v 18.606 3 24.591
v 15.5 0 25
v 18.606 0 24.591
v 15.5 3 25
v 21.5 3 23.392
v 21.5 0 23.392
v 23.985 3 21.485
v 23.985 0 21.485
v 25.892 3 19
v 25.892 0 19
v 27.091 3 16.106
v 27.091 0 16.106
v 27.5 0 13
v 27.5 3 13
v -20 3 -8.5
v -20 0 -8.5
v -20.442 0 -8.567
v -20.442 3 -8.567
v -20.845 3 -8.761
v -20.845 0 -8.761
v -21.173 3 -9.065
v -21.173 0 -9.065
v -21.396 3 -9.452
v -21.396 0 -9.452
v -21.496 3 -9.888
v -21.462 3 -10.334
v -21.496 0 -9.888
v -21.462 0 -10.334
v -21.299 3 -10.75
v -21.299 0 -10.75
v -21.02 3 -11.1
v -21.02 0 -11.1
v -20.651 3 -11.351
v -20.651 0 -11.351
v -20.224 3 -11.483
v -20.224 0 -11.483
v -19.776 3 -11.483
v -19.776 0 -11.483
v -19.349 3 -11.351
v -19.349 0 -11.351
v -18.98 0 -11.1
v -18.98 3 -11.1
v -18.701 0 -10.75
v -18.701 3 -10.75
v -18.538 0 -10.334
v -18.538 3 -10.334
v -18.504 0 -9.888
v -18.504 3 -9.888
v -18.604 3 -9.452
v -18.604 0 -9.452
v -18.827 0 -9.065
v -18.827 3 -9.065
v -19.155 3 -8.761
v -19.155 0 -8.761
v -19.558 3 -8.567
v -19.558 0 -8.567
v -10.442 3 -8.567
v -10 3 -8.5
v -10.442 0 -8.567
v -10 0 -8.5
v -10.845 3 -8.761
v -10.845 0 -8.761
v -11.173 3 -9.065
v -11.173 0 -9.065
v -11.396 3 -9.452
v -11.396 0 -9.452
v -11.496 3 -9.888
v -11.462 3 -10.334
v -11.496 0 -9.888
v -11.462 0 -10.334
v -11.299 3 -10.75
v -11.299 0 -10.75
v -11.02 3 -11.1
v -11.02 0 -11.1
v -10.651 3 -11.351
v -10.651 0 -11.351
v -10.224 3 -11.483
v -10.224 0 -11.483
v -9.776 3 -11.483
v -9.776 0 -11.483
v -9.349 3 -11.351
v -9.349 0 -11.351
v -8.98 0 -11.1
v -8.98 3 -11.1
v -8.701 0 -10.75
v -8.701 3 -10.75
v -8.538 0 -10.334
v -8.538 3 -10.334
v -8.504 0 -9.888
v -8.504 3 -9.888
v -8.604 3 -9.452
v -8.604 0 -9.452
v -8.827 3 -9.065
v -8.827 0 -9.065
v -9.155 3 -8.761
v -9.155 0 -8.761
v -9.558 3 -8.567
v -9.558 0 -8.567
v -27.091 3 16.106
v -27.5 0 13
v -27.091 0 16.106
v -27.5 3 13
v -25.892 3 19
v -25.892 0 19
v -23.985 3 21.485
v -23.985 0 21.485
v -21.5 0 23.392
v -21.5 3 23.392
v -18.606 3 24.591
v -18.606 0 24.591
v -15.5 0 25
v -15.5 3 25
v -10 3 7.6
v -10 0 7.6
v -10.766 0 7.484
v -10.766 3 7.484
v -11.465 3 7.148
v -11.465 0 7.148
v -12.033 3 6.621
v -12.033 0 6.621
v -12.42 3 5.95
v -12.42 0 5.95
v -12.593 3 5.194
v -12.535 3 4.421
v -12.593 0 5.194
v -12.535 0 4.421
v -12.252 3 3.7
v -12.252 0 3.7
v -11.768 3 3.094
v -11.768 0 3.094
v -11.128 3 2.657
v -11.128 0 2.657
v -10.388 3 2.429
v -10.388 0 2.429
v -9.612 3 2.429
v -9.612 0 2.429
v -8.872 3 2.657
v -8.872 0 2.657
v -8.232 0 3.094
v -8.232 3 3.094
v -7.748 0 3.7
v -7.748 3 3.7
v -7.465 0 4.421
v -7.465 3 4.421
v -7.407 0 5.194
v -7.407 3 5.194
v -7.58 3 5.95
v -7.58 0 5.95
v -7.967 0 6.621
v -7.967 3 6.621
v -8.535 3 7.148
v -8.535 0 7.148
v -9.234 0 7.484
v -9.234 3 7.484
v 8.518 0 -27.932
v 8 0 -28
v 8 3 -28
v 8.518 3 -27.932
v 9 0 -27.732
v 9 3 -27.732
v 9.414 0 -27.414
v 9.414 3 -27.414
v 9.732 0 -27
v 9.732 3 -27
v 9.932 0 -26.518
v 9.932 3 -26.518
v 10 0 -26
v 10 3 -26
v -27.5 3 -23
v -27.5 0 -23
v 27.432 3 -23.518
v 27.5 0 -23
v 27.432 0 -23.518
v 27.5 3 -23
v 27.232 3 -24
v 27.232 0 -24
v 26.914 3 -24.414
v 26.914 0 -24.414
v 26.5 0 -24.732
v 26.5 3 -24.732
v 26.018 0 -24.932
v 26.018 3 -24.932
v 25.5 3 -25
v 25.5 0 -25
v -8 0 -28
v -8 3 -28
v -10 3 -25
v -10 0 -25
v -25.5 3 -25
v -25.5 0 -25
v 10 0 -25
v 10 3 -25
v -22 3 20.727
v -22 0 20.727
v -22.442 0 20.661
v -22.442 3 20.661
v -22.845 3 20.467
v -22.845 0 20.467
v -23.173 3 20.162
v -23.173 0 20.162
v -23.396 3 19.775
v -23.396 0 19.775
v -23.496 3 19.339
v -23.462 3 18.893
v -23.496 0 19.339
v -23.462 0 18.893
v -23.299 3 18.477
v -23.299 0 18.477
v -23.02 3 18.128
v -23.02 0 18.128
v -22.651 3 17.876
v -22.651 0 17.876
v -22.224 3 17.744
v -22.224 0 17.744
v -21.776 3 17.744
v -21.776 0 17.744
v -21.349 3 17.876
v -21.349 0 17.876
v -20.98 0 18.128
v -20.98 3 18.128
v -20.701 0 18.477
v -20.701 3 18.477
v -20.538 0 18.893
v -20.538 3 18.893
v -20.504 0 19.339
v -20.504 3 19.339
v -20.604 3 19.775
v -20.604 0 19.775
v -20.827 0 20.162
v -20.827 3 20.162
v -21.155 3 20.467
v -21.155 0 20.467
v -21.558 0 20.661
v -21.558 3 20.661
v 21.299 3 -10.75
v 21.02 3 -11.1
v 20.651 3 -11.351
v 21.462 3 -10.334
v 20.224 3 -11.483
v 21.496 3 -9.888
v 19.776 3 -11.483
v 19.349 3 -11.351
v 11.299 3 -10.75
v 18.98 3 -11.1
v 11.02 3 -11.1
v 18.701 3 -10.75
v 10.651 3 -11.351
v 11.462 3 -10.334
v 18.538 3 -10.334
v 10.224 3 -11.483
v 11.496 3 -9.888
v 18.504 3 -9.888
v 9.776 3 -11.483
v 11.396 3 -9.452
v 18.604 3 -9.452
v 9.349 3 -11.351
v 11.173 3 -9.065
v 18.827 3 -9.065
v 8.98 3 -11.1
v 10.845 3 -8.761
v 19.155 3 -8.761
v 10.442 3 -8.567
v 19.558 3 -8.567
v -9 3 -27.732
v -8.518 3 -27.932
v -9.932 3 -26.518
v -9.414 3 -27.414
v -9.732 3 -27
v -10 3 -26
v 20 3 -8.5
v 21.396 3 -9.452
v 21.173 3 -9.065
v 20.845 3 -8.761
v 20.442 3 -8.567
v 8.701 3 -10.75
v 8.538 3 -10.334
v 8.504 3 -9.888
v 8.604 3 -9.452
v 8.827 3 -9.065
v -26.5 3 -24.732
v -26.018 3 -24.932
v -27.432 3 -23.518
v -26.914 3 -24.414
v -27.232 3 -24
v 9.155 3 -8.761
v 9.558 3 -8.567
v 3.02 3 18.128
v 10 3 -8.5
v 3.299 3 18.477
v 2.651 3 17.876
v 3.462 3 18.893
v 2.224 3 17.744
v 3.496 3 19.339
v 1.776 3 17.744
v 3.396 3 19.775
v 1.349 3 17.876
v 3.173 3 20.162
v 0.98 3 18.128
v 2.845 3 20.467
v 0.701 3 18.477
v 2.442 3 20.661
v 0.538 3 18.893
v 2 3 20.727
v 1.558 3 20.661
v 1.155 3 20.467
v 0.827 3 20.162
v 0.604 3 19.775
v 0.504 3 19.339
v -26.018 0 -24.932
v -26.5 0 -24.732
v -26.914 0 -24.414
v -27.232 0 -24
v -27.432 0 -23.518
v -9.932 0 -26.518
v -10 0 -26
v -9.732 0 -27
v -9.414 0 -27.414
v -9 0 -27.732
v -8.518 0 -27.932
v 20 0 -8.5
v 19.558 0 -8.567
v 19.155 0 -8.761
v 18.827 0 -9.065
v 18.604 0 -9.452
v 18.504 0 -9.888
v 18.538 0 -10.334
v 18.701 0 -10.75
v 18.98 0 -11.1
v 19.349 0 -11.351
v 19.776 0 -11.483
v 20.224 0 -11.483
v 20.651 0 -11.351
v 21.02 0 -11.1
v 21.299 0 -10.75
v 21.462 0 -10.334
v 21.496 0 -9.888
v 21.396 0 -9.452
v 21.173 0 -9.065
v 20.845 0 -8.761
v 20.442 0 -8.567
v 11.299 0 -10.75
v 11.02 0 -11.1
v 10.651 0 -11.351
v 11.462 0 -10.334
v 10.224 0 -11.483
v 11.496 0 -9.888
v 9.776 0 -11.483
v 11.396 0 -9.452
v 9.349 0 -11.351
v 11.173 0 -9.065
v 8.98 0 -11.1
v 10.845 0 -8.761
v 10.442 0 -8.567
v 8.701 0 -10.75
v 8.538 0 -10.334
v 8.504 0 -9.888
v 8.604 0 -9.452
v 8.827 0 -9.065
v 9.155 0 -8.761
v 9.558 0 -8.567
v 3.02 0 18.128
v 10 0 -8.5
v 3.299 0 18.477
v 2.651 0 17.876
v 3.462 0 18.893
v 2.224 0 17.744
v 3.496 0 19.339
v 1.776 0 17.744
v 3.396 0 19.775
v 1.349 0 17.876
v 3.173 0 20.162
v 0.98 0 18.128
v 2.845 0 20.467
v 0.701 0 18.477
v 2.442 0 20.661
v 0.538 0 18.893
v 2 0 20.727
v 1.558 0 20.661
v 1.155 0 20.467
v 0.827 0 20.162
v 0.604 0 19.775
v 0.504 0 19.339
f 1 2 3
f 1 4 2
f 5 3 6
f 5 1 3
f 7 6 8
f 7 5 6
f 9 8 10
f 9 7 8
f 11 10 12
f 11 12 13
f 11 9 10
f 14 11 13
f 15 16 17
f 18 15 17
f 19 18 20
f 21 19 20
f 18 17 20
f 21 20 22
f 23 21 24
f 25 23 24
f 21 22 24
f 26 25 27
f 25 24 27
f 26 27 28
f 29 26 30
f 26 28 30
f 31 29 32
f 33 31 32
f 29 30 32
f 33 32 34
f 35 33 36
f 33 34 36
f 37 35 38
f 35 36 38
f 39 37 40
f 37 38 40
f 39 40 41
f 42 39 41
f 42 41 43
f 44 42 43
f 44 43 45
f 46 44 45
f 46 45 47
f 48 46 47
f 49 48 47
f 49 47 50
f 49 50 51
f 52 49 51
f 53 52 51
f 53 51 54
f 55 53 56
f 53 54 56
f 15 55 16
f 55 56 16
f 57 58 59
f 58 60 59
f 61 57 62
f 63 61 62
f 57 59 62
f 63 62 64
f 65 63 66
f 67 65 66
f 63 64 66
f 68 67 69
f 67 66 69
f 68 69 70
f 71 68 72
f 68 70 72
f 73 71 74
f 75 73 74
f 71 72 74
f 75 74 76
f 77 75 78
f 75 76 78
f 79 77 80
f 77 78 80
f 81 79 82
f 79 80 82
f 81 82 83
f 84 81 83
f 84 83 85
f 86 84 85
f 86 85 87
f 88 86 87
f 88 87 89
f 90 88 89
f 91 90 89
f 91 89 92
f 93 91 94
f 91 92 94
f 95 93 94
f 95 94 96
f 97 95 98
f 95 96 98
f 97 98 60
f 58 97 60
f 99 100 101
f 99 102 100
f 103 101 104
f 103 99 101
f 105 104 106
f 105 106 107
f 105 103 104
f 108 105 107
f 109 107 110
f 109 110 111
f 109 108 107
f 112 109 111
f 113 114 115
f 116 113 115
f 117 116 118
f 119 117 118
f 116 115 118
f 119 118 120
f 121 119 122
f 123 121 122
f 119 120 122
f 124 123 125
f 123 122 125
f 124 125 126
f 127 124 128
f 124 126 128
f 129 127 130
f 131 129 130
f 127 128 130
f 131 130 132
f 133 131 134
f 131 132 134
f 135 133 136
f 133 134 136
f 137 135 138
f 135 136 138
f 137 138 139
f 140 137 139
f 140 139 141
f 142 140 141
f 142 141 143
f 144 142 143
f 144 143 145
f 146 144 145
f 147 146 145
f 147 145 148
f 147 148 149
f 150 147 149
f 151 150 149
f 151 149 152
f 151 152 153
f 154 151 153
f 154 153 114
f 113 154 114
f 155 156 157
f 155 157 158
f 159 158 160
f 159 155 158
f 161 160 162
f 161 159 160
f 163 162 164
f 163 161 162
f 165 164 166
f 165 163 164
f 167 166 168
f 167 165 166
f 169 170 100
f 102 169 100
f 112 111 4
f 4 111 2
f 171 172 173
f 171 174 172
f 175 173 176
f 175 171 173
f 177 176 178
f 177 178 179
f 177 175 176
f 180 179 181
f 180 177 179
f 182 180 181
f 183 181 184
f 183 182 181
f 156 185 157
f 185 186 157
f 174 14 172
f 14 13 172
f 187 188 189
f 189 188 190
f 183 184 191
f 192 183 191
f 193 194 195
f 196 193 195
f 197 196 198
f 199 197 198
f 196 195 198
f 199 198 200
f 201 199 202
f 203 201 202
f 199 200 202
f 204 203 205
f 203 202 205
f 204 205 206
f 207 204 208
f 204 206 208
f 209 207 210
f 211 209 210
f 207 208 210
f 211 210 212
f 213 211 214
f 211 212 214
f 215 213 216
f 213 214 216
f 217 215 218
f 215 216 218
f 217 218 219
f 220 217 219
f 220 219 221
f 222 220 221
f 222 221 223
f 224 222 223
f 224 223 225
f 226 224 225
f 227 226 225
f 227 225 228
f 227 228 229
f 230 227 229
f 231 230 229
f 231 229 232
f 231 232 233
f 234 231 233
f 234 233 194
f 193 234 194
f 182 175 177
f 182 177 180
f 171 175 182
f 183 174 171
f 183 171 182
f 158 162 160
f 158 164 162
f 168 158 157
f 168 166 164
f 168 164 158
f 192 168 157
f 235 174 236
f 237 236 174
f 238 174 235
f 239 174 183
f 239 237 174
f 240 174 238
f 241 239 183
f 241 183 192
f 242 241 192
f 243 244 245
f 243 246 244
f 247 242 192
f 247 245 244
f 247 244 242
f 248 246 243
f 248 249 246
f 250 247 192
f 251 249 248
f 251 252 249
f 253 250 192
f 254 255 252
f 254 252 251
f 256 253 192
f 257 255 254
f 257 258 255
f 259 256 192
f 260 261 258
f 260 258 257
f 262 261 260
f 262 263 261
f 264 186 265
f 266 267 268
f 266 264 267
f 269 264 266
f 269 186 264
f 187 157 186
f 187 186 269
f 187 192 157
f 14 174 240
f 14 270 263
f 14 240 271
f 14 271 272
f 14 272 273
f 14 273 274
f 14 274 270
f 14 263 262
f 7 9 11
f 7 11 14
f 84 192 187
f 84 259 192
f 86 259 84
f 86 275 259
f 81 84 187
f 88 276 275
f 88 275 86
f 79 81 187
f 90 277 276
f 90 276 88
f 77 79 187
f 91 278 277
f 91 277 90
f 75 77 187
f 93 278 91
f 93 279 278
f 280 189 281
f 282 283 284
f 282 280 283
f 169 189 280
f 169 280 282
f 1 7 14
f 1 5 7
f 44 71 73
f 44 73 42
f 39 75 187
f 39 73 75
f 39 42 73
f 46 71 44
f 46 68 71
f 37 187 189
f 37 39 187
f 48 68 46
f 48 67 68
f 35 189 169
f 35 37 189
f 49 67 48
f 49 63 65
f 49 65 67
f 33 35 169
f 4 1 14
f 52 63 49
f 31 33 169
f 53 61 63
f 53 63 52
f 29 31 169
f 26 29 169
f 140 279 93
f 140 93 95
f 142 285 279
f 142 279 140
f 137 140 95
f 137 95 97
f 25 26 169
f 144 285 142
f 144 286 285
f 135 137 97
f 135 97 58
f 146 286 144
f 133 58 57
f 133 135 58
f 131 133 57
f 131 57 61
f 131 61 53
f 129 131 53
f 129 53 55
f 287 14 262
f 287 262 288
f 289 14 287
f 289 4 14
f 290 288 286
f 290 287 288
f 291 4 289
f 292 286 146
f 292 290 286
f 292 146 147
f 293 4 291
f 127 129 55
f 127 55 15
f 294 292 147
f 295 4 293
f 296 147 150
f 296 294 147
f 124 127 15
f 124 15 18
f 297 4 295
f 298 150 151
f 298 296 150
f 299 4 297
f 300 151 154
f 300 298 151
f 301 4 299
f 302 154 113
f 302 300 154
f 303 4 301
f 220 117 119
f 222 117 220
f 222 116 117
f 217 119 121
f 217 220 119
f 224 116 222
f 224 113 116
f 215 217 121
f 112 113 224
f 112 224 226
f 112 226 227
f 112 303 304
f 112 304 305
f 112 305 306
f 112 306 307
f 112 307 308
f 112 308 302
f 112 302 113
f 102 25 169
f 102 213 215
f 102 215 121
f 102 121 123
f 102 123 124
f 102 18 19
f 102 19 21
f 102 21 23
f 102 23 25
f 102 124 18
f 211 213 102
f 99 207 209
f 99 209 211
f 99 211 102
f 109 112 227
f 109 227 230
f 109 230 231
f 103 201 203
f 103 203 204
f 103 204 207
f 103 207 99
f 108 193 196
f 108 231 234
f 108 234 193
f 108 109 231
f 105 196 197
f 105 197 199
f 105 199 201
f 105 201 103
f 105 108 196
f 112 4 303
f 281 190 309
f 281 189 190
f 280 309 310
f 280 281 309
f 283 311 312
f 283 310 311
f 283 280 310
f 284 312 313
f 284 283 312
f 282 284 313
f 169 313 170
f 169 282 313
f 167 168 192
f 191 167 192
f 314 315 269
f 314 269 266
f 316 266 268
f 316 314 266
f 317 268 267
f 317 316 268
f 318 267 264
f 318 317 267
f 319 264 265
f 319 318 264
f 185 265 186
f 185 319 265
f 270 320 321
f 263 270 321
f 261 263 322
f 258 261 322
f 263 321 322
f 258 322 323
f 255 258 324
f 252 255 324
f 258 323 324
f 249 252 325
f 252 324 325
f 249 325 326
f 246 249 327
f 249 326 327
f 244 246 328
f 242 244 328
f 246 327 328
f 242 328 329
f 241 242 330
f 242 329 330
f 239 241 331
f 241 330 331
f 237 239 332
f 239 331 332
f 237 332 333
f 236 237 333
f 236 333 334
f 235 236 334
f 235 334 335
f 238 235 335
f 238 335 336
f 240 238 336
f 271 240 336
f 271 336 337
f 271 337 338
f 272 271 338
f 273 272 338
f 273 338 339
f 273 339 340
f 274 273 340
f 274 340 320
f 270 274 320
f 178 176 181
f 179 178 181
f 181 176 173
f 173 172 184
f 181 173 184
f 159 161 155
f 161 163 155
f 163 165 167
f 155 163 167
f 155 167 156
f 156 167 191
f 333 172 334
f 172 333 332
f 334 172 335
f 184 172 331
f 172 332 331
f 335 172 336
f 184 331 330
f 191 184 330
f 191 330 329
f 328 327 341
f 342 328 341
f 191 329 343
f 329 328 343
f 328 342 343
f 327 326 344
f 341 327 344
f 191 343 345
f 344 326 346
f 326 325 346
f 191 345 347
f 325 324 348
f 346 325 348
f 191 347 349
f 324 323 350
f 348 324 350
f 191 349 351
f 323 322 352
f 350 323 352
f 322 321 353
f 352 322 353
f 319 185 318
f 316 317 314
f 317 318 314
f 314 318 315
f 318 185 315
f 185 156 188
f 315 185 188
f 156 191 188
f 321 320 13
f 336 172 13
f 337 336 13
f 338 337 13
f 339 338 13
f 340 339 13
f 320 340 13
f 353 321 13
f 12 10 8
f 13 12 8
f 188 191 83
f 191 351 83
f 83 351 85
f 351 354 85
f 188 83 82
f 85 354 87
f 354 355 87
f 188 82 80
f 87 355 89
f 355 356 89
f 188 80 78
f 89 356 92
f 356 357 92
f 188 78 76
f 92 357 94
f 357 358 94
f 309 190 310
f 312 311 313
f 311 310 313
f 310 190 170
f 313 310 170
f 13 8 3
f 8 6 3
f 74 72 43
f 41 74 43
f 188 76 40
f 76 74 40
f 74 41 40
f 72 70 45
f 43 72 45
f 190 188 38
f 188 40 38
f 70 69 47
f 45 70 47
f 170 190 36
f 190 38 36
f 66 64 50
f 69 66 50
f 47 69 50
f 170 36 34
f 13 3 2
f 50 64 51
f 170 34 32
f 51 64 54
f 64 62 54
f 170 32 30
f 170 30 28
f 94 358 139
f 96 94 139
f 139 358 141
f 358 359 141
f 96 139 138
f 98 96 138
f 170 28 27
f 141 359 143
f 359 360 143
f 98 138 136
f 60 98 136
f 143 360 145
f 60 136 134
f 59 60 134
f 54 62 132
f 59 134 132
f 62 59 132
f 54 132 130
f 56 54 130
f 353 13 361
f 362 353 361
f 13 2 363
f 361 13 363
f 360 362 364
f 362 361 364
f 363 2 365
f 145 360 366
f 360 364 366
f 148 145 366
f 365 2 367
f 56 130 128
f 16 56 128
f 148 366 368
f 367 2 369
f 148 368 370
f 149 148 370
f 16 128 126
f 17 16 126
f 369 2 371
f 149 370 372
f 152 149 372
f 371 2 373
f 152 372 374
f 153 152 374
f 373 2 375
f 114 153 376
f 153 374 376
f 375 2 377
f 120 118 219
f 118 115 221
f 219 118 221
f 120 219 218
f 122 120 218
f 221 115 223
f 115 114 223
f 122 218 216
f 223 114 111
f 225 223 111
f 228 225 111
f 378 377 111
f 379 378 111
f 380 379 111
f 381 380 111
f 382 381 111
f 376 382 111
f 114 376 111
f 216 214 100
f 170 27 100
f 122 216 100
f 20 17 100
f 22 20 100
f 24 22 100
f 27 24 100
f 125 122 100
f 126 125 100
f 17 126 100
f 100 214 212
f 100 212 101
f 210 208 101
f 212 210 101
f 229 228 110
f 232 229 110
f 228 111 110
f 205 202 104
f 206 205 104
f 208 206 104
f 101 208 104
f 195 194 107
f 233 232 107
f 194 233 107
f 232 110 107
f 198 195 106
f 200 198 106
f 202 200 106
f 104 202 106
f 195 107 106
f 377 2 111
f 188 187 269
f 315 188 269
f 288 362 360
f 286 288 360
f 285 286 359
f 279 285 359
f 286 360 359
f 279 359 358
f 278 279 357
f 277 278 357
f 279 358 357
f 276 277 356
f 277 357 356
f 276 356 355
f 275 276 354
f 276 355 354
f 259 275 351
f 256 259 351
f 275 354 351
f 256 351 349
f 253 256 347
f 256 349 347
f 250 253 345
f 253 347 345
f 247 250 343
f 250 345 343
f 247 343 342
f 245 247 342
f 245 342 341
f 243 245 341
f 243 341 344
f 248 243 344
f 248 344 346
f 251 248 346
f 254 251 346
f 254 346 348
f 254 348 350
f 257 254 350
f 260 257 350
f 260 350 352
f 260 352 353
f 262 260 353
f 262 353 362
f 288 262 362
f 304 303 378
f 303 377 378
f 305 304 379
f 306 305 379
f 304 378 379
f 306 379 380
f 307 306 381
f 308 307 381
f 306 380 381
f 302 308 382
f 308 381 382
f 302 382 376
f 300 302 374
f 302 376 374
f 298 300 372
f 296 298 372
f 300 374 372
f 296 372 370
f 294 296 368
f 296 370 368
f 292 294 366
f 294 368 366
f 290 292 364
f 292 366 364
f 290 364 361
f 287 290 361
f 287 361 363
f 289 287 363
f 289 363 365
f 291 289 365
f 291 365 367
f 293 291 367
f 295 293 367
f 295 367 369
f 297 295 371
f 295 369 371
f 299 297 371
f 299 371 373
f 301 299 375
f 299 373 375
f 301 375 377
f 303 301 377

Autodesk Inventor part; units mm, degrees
ref_plane "YZ Plane" through (0, 0, 0) normal (1, 0, 0) x (0, 1, 0)
ref_plane "XZ Plane" through (0, 0, 0) normal (0, 1, 0) x (-1, 0, 0)
ref_plane "XY Plane" through (0, 0, 0) normal (0, 0, 1) x (1, 0, 0)
sketch "Boceto1" plane through (0, 0, 0) normal (0, 1, 0) x (-1, 0, 0)
  line L0 (27.5, 25) -> (-27.5, 25)
  line L1 (-27.5, 25) -> (-27.5, -25)
  line L2 (-27.5, -25) -> (27.5, -25)
  line L3 (27.5, -25) -> (27.5, 25)
  line L4 (27.5, 25) -> (-27.5, -25) construction
  line L5 (-27.5, 25) -> (27.5, -25) construction
  point P0 (0, 0)
  dimension "d0" = 55
  dimension "d1" = 50
extrude "Extrusión1" add sketch "Boceto1" along normal blind 3
sketch "Boceto2" plane through (0, 3, 0) normal (0, 1, 0) x (1, 0, 0)
  line L0 (10, 22) -> (-10, 22)
  line L1 (-10, 22) -> (-10, 28)
  line L2 (-10, 28) -> (10, 28)
  line L3 (10, 28) -> (10, 22)
  line L4 (27.5, 25) -> (-27.5, 25) construction
  line L5 (10, 22) -> (-10, 28) construction
  line L6 (-10, 22) -> (10, 28) construction
  point P0 (0, 0)
  point P1 (0, 25)
  dimension "d4" = 6
  dimension "d5" = 20
extrude "Extrusión2" add sketch "Boceto2" against normal blind 3
fillet "Empalme1" radius 2 4 edges at (-27.5, 1.5, -25) (-10, 1.5, -28) (10, 1.5, -28) (27.5, 1.5, -25)
sketch "Boceto3" plane through (0, 3, 0) normal (0, 1, 0) x (1, 0, 0)
  circle A0 centre (-20, 10) radius 1.6 construction
  circle A1 centre (-10, -5) radius 1.5 construction
  circle A2 centre (-10, 10) radius 1.6 construction
  line L0 (0, 38.6) -> (0, -35.6) construction
  circle A3 centre (20, 10) radius 1.6 construction
  circle A4 centre (10, 10) radius 1.6 construction
  circle A5 centre (-22, -19.2272) radius 1.7 construction
  circle A6 centre (2, -19.2272) radius 1.7 construction
  point P0 (0, 0)
hole "Agujero1" at (-20, 3, -10) at (-10, 3, -10) at (10, 3, -10) at (20, 3, -10) at (2, 3, 19.2272) at (-22, 3, 19.2272) direction (0, -1, 0) diameter 3 end through all
sketch "Boceto4" plane through (0, 3, 0) normal (0, 1, 0) x (1, 0, 0)
  circle A0 centre (-10, -5) radius 1.5 construction
  point P0 (0, 0)
hole "Agujero2" at (-10, 3, 5) direction (0, -1, 0) diameter 5.2 end through all
fillet "Empalme2" radius 12 2 edges at (27.5, 1.5, 25) (-27.5, 1.5, 25)
properties part number "PlacaBaseGarraPotenciaSTD"
